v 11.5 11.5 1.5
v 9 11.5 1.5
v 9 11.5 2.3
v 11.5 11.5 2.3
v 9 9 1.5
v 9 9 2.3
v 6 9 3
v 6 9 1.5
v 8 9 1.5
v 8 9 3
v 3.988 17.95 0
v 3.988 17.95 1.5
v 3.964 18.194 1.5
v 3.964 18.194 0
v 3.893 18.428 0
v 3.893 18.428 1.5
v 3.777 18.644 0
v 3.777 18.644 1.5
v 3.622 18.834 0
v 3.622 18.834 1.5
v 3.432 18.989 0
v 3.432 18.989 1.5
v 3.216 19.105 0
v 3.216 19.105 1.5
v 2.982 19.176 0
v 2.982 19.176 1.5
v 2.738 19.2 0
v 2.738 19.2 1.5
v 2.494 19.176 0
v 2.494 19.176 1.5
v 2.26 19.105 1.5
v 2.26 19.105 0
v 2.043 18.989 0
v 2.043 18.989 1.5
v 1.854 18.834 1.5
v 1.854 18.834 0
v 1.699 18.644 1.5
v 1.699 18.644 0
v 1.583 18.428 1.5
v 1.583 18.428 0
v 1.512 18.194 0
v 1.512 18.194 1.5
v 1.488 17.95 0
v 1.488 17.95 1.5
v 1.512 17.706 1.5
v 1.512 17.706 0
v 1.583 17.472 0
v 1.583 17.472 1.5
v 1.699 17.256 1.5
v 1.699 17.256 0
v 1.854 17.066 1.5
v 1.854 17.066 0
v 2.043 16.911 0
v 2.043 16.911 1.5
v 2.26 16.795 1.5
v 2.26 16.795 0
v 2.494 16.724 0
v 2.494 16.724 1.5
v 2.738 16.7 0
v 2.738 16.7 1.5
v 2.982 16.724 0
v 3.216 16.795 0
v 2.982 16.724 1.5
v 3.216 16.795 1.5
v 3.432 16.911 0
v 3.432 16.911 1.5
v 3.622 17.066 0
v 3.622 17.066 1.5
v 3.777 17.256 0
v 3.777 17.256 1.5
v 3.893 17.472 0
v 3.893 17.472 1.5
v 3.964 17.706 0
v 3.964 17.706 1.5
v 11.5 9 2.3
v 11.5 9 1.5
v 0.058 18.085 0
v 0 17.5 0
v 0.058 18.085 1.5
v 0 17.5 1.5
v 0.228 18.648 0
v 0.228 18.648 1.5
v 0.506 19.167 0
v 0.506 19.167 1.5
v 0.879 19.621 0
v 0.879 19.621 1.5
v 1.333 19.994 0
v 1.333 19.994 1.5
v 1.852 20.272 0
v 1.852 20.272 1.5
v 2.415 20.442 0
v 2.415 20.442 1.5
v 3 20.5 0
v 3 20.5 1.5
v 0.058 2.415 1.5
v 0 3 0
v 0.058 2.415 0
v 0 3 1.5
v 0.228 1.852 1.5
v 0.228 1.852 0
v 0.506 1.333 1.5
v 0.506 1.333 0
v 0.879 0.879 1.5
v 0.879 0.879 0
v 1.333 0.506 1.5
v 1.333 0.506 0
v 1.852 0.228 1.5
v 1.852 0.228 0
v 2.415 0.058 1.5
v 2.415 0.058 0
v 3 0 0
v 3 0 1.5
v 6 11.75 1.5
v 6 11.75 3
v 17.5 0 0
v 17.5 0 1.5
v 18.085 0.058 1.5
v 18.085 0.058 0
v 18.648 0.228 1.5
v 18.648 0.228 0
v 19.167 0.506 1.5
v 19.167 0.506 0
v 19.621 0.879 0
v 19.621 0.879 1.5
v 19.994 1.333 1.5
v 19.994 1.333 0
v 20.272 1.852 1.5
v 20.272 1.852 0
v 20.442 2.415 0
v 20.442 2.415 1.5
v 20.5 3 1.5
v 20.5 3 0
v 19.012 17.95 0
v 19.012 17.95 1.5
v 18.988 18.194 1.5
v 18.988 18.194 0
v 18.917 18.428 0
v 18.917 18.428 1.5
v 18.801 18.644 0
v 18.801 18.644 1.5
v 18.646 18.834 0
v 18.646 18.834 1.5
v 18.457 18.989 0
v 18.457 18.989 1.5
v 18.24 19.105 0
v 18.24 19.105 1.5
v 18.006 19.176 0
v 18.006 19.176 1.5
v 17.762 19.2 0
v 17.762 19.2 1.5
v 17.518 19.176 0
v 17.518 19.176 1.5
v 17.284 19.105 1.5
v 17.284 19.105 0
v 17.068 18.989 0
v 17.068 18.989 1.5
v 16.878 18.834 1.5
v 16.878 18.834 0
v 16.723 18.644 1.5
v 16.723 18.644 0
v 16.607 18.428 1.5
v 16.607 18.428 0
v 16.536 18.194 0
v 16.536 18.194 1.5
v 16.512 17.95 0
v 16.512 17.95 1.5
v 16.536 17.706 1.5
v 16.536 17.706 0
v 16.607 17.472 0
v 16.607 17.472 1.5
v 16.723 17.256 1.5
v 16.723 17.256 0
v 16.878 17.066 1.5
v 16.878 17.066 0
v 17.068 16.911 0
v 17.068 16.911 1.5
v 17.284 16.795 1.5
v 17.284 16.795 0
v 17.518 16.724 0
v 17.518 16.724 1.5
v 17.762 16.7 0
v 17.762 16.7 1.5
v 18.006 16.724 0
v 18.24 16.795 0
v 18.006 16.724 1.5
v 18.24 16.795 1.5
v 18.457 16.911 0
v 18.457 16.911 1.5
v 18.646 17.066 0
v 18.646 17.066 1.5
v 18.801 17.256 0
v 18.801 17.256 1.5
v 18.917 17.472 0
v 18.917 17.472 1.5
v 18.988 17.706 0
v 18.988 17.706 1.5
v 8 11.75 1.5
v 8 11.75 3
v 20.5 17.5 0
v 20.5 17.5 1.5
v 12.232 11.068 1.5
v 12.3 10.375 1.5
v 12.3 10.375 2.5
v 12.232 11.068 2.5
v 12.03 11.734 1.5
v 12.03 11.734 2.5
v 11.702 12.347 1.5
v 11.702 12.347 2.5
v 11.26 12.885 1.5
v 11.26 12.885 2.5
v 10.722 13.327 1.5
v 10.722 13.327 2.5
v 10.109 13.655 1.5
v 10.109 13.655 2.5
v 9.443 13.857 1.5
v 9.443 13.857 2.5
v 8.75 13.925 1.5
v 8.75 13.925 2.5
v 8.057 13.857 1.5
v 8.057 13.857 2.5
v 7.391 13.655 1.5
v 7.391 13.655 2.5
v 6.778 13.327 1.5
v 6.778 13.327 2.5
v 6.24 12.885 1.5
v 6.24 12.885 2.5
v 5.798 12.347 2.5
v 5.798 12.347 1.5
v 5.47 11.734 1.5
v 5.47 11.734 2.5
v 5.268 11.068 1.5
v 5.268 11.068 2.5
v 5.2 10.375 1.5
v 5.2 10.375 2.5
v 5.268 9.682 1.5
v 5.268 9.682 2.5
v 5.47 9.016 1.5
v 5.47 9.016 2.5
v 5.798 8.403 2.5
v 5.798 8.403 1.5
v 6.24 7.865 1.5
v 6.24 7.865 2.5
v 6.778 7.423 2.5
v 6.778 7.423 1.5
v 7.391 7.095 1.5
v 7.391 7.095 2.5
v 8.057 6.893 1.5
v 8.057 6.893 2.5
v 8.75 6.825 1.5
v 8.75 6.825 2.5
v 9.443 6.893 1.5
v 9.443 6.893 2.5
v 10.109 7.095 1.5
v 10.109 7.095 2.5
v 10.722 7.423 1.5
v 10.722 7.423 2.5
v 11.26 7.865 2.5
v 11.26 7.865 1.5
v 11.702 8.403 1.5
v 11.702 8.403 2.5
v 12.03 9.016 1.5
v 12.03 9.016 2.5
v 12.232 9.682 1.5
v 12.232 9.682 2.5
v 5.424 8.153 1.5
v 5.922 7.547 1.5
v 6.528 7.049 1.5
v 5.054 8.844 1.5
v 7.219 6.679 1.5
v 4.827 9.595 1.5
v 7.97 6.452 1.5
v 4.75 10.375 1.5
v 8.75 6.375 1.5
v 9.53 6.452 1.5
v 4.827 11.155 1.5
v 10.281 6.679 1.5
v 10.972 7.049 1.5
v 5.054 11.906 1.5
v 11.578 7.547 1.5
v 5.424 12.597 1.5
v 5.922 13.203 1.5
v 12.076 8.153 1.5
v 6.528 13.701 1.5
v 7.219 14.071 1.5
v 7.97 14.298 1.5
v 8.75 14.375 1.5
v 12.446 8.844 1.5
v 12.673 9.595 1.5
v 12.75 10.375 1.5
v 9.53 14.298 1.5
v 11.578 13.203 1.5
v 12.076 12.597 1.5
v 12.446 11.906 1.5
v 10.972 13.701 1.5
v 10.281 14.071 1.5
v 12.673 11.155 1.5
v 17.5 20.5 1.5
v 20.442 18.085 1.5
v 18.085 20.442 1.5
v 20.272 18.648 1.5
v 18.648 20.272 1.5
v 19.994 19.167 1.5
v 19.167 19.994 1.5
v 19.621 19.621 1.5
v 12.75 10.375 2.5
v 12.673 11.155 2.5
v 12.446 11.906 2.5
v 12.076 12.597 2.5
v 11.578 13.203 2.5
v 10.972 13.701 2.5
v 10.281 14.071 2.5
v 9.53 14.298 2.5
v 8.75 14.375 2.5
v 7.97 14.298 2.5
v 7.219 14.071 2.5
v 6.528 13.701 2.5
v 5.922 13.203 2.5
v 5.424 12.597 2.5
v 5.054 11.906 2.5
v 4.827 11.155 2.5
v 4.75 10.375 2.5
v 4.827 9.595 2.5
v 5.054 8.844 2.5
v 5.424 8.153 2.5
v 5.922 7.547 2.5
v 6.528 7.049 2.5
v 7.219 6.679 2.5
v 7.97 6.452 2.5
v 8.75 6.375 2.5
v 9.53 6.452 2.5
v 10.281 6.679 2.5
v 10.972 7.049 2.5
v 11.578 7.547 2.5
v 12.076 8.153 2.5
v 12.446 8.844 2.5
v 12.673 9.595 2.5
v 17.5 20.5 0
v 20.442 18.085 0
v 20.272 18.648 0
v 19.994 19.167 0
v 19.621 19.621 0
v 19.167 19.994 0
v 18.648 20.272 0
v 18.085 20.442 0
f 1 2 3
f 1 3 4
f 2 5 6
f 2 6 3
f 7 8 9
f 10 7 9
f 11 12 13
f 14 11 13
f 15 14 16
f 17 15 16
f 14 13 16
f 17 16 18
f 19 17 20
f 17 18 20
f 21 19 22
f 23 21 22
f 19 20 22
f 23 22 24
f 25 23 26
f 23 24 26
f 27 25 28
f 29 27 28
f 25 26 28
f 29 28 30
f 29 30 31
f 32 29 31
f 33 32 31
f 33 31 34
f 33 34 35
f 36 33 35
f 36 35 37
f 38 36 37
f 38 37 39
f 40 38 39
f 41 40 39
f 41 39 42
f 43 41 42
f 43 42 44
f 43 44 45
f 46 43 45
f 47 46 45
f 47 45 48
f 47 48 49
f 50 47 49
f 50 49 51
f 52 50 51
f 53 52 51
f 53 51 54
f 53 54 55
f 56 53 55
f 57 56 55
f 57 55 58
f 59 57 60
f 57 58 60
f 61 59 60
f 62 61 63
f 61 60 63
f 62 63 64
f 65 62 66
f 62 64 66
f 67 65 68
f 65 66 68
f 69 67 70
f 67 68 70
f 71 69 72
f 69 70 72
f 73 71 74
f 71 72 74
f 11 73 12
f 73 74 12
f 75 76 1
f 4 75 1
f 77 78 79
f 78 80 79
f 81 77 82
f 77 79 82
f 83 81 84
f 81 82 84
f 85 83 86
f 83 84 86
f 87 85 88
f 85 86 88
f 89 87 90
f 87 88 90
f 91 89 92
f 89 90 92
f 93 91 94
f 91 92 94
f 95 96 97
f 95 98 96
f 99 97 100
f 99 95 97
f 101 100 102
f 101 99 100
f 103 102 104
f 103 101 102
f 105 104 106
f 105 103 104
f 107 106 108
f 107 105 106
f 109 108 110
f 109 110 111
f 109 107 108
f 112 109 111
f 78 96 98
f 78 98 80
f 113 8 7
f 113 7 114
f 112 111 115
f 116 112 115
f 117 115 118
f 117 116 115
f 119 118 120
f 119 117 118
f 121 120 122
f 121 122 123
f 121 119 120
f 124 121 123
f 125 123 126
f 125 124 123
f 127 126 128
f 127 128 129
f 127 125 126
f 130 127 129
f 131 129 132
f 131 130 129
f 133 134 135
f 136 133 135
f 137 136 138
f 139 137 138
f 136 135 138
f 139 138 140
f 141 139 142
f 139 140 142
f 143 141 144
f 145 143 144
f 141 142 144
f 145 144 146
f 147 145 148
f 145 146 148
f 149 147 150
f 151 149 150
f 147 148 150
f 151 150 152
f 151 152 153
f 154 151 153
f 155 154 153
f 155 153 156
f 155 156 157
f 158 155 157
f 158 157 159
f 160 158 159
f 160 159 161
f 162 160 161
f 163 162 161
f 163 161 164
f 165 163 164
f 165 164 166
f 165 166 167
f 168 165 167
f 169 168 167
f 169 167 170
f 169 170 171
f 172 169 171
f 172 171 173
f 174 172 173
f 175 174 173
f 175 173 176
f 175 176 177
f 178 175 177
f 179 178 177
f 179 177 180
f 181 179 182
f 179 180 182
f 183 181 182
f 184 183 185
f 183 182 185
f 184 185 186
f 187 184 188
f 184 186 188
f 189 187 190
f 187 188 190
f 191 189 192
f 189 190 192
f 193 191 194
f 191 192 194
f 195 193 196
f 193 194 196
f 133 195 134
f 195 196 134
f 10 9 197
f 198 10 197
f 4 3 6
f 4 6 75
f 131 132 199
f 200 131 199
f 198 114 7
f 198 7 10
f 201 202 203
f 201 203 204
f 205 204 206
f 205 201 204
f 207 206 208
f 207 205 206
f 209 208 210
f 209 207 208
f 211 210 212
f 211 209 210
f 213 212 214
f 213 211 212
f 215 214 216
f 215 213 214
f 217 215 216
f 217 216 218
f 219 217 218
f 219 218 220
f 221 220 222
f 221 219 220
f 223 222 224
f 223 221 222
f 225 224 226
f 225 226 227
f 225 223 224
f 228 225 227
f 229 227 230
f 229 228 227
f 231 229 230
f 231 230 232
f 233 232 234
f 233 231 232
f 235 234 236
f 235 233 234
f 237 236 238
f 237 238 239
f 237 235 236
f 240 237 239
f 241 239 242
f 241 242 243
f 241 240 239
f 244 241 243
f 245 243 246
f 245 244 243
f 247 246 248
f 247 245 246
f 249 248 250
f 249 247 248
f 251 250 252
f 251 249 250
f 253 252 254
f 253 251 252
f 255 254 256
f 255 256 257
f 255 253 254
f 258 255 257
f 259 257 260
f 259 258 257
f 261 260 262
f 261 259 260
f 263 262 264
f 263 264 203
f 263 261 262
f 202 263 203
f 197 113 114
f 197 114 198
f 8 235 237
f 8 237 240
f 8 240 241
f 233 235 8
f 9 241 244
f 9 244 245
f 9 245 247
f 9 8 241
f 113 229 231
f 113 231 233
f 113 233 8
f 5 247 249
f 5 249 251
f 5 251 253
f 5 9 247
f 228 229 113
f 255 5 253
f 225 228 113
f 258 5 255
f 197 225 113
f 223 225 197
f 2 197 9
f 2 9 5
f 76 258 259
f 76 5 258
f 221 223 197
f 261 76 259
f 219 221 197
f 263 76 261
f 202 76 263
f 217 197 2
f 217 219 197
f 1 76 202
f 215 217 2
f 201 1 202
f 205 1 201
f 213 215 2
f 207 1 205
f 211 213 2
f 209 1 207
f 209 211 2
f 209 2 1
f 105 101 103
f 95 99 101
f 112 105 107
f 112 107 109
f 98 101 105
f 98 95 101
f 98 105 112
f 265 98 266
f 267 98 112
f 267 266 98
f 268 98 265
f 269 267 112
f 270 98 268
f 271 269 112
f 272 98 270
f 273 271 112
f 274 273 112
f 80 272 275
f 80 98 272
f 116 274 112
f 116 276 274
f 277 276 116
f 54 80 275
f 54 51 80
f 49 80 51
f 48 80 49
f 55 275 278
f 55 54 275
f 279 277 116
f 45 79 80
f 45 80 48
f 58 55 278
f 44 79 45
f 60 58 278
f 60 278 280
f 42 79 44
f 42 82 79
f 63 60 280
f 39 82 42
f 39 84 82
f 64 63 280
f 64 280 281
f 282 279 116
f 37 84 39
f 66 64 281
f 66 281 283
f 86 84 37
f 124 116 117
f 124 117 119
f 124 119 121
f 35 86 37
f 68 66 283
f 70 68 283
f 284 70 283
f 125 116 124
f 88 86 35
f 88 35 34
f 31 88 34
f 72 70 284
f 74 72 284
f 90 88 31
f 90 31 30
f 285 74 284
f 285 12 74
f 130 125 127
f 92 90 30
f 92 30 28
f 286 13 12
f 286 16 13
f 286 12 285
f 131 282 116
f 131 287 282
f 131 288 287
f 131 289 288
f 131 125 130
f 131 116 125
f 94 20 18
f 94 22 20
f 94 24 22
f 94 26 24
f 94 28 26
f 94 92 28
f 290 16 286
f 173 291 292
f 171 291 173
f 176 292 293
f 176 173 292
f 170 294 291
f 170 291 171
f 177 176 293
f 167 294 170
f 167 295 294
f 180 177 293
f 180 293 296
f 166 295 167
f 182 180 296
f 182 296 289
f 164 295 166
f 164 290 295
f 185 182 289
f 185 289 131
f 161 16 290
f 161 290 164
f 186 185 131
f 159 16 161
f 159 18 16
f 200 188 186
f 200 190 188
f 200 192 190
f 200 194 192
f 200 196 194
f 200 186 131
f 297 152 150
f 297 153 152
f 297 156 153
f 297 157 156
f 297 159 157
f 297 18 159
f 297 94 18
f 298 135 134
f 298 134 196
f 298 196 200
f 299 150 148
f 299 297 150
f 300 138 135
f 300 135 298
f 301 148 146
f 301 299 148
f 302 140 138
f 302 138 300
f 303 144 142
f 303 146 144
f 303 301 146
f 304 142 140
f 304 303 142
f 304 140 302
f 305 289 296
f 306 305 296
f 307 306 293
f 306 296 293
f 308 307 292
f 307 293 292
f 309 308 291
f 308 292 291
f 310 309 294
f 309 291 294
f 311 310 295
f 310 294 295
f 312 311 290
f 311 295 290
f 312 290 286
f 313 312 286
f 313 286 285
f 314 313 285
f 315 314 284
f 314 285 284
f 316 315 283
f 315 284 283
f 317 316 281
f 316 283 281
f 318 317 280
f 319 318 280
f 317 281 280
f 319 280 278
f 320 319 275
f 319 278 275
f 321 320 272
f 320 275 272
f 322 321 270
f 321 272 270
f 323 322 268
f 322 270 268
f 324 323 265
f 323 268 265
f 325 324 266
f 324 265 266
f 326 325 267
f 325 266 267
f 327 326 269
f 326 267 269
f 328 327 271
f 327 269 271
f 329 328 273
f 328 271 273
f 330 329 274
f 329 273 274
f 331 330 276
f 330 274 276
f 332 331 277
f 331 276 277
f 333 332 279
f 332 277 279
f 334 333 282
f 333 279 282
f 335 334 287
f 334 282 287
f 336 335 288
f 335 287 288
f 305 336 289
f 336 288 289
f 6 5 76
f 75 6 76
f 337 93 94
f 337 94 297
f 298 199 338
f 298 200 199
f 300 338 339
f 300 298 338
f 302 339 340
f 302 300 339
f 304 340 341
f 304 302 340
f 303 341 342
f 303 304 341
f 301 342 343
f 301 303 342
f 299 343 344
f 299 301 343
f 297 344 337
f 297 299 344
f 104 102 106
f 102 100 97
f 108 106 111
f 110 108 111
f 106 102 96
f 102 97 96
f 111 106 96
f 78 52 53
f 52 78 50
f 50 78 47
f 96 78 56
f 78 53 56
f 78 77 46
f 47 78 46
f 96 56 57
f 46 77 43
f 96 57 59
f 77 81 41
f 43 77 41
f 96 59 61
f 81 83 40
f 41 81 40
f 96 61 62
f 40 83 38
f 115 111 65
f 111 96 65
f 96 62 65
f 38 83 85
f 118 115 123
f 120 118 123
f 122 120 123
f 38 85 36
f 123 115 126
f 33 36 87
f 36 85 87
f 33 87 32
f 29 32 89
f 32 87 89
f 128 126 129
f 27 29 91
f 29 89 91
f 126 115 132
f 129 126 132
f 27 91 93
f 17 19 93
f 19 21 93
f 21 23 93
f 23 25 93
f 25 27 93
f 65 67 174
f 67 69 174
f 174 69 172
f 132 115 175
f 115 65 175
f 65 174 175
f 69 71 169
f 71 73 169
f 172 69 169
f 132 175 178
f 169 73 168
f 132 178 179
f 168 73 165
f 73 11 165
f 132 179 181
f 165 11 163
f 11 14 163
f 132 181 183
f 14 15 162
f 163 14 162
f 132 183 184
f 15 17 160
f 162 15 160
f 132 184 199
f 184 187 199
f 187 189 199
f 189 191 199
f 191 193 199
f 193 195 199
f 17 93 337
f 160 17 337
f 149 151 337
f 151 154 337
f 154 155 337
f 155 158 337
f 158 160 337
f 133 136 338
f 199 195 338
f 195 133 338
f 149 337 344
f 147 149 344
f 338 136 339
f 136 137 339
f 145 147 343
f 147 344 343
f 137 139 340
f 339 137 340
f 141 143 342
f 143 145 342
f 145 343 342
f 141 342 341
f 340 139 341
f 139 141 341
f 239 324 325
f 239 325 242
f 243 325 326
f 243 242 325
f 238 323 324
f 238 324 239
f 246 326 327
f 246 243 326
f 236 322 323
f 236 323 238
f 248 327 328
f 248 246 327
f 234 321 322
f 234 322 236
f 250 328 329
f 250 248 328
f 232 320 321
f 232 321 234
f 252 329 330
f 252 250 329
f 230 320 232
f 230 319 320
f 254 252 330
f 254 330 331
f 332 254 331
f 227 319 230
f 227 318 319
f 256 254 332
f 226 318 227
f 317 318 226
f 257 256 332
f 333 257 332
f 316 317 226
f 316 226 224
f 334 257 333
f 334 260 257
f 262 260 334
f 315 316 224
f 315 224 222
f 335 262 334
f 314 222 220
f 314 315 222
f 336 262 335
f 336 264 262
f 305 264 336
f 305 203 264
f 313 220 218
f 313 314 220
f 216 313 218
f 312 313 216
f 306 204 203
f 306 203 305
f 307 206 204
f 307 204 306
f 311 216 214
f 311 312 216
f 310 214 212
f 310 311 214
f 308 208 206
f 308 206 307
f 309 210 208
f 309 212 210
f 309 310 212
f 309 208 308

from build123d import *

# Parameters (mm, degrees)
SKETCH1_W           = 20.5
SKETCH1_H           = 20.5
BOSS_EXTRUDE1_DEPTH = 1.5
FILLET1_R           = 3
SKETCH9_R           = 1.25
CUT_EXTRUDE1_DEPTH  = 4.5
SKETCH10_W          = 2.5
SKETCH10_H          = 2.5
BOSS_EXTRUDE2_DEPTH = 0.8
SKETCH11_W          = 2
SKETCH11_H          = 2.75
BOSS_EXTRUDE3_DEPTH = 1.5
SKETCH12_R          = 4
SKETCH12_R_2        = 3.55
BOSS_EXTRUDE4_DEPTH = 1


with BuildPart() as part:
    # Sketch1 → Boss-Extrude1 (new body)
    with BuildSketch(Plane.XY):
        with Locations((10.25, 10.25)):
            Rectangle(SKETCH1_W, SKETCH1_H)
    extrude(amount=BOSS_EXTRUDE1_DEPTH)

    # Fillet1
    fillet1_edges = [part.edges().sort_by_distance(p)[0] for p in [
        (0, 20.5, 0.75),
        (20.5, 20.5, 0.75),
        (20.5, 0, 0.75),
        (0, 0, 0.75),
    ]]
    fillet(fillet1_edges, radius=FILLET1_R)

    # Sketch9 → Cut-Extrude1 (cut)
    with BuildSketch(Plane.XY.offset(1.5)):
        with Locations((17.762103221, 17.95)):
            Circle(SKETCH9_R)
        with Locations((2.737896779, 17.95)):
            Circle(SKETCH9_R)
    extrude(amount=-CUT_EXTRUDE1_DEPTH, mode=Mode.SUBTRACT)

    # Sketch10 → Boss-Extrude2 (add)
    with BuildSketch(Plane.XY.offset(1.5)):
        with Locations((10.25, 10.25)):
            Rectangle(SKETCH10_W, SKETCH10_H)
    extrude(amount=BOSS_EXTRUDE2_DEPTH)

    # Sketch11 → Boss-Extrude3 (add)
    with BuildSketch(Plane.XY.offset(1.5)):
        with Locations((7, 10.375)):
            Rectangle(SKETCH11_W, SKETCH11_H)
    extrude(amount=BOSS_EXTRUDE3_DEPTH)

    # Sketch12 → Boss-Extrude4 (add)
    with BuildSketch(Plane.XY.offset(1.5)):
        with Locations((8.75, 10.375)):
            Circle(SKETCH12_R)
        with Locations((8.75, 10.375)):
            Circle(SKETCH12_R_2, mode=Mode.SUBTRACT)
    extrude(amount=BOSS_EXTRUDE4_DEPTH)


solid = part.part
